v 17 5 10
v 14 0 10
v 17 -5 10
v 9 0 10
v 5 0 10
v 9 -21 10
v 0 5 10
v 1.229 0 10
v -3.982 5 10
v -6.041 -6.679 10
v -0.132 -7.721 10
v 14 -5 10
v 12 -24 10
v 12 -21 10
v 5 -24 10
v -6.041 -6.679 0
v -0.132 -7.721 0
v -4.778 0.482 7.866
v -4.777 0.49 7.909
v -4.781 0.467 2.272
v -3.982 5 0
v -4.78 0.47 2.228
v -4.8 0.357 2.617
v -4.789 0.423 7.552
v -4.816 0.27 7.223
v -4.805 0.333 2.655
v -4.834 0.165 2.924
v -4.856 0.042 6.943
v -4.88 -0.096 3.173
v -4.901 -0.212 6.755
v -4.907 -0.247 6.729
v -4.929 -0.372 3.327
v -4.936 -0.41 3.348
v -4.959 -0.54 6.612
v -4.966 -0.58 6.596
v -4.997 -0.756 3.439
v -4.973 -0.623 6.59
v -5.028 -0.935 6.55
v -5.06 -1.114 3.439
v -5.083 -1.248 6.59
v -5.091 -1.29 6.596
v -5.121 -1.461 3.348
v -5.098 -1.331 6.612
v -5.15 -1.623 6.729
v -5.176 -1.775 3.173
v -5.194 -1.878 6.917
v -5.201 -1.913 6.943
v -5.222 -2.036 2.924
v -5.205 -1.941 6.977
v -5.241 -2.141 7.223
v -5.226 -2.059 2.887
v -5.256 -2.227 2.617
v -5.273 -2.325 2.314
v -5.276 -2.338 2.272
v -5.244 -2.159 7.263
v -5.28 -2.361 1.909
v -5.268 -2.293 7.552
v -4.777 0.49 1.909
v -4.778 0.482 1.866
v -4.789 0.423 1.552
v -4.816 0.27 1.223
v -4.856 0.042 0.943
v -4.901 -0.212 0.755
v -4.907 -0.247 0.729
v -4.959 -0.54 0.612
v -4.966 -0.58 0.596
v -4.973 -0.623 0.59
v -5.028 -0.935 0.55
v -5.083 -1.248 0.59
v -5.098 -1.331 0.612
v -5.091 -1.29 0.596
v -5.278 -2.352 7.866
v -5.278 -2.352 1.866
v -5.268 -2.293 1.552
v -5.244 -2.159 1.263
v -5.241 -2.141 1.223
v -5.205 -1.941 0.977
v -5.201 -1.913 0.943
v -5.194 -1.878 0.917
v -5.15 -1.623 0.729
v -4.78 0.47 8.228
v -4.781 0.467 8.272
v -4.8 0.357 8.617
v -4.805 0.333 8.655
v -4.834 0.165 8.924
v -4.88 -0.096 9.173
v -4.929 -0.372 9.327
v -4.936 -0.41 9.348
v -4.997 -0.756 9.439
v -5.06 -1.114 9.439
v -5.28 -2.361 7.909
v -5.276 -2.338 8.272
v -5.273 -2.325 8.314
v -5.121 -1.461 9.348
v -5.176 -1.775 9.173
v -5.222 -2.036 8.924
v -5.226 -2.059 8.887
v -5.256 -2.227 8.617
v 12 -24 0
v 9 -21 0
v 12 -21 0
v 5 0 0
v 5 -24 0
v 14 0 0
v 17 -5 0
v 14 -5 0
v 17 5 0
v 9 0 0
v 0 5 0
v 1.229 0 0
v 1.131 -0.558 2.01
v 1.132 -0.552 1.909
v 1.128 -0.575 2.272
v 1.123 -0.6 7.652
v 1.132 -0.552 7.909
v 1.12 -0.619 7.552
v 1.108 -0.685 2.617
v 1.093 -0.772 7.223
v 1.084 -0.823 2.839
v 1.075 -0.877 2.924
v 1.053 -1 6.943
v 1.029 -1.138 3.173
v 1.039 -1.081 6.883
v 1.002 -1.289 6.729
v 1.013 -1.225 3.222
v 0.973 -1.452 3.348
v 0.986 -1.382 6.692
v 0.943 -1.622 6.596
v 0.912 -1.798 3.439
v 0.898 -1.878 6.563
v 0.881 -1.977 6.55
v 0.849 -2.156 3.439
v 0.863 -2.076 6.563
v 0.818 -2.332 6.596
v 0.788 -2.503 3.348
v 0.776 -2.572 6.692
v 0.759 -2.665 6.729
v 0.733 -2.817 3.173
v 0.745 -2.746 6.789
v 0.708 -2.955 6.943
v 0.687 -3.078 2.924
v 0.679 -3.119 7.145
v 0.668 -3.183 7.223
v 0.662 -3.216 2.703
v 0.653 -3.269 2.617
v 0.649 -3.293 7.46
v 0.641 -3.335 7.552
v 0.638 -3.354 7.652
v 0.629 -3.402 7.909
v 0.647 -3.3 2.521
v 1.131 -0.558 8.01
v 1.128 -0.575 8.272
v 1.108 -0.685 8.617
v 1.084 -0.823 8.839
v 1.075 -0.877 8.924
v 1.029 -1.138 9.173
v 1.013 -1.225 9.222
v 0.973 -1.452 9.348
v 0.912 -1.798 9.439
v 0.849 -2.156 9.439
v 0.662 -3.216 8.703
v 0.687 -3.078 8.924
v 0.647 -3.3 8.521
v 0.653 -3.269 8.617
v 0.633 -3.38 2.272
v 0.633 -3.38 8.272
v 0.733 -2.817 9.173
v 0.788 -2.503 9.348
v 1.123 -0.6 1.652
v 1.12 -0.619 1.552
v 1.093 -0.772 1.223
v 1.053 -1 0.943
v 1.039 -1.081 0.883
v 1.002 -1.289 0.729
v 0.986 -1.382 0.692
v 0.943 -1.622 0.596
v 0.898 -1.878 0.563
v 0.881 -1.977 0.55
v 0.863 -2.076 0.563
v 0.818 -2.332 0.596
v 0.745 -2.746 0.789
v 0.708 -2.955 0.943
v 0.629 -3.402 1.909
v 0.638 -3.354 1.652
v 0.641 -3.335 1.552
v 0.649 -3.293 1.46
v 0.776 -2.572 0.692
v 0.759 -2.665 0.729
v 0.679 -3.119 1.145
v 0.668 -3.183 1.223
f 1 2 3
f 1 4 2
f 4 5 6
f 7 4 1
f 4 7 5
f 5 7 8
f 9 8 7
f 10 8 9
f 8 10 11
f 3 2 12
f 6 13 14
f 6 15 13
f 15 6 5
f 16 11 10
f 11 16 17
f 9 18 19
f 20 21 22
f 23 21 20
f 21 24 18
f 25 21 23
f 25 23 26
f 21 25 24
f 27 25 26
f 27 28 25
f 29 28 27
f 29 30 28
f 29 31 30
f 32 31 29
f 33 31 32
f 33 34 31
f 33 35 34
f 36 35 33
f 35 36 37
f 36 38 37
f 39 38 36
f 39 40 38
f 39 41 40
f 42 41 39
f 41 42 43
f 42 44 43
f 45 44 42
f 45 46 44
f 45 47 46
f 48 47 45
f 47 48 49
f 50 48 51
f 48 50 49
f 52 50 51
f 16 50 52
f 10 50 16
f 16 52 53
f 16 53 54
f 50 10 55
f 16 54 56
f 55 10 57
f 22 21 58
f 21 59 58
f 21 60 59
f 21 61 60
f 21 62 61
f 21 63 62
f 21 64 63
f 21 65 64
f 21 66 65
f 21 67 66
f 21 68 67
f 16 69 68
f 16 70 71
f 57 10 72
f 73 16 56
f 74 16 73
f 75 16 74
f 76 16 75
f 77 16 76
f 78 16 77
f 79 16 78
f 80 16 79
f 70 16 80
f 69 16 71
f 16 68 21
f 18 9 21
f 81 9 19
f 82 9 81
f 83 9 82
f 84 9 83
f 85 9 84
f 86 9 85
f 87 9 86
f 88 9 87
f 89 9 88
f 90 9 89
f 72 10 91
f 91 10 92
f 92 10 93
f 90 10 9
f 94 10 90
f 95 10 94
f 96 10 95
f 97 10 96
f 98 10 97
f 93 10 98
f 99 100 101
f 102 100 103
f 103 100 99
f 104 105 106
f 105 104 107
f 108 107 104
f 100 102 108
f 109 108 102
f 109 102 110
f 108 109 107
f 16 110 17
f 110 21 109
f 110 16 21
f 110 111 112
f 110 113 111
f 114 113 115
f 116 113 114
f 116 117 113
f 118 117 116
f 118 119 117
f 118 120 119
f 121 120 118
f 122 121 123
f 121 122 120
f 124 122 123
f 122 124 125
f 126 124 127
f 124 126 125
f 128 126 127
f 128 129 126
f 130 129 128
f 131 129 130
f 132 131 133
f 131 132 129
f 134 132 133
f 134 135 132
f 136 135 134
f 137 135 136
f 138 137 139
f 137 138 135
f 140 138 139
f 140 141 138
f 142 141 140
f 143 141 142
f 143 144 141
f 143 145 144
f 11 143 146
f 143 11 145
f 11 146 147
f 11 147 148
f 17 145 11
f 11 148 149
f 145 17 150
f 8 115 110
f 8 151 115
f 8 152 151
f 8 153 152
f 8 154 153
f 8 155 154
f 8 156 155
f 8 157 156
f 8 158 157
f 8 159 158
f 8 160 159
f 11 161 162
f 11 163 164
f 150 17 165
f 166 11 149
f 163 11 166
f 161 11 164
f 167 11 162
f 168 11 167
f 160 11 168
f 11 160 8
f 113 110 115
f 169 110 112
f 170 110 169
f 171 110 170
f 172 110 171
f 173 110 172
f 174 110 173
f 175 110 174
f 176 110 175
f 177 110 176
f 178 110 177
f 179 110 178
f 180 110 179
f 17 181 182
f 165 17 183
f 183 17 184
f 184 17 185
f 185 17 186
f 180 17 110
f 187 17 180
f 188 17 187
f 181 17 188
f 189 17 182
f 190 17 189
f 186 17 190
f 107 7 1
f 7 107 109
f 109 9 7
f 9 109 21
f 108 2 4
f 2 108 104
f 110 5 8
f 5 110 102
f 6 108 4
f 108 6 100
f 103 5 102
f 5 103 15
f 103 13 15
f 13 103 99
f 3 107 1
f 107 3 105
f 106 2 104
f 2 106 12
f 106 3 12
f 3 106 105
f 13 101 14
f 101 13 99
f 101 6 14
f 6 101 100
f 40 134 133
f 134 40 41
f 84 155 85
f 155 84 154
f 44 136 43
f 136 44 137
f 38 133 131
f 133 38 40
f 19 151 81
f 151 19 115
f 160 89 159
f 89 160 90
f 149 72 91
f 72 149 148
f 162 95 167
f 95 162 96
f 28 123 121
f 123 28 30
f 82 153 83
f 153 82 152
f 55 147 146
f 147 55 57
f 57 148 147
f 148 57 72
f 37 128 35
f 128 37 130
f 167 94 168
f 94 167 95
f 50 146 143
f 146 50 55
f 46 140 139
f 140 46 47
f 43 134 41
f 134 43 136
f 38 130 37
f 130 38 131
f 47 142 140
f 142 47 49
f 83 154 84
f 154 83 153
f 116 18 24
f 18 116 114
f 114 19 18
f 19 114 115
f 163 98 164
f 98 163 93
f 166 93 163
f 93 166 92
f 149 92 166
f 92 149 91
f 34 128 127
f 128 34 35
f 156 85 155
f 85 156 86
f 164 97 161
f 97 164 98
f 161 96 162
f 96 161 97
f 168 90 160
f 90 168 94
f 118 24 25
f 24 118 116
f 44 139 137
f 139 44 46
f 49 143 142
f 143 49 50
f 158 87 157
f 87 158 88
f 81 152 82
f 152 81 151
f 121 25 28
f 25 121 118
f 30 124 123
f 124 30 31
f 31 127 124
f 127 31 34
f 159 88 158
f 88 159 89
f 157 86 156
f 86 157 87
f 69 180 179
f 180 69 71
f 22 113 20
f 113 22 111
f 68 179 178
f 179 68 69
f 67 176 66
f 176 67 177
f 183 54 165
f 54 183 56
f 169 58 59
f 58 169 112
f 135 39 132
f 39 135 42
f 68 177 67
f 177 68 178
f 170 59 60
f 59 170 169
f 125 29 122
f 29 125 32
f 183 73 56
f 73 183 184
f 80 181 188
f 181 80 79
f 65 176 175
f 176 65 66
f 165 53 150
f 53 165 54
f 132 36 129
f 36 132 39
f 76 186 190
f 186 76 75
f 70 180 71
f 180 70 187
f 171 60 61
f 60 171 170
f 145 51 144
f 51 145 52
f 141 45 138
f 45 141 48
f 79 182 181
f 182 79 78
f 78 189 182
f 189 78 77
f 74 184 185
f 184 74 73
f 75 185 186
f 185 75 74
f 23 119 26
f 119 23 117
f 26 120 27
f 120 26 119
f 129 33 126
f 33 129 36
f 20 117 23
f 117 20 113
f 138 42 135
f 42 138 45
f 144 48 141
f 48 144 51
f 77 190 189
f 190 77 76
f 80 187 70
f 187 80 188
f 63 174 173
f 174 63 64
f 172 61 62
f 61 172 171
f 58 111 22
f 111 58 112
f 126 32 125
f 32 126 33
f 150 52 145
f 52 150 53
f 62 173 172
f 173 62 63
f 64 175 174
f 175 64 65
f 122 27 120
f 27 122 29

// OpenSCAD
/*
 * Created by:
 * Thomas Buck <xythobuz@xythobuz.de> in March 2016
 *
 * Licensed under the Creative Commons - Attribution license.
 */

// -----------------------------------------------------------

$fn = 25;

height = 10;

// works properly from around 40 to 80 degrees
display_angle = 80; // in degrees

// "right", "left", "both" or "none"
hole_position = "both";
hole_diameter = 2.9;

// -----------------------------------------------------------

module holder() {
    // front part
    translate([10, 0, 0])
    difference() {
        translate([-13 + (5 * sin(display_angle - 45)),
                    -6 - (3 * sin(display_angle - 45)), 0])
            rotate([0, 0, display_angle])
            cube([13, 6, height]);
    
        // cut off top edge
        translate([-15, 5, 0])
            cube([10, 3, height]);
    }

    // upper body
    translate([0, 0, 0])
        cube([10, 5, height]);

    // lower body
    translate([5, -24, 0])
        cube([4, 24, height]);

    // upper border
    translate([10, 0, 0])
        cube([7, 5, height]);

    // upper lip
    translate([14, -5, 0])
        cube([3, 5, height]);

    // lower border
    translate([9, -24, 0])
        cube([3, 3, height]);
}

difference() {
    holder();
    
    // insert holes
    if ((hole_position == "right") || (hole_position == "both")) {
        rotate([0, 90, 90 + display_angle])
            translate([-8, -0.5 + (4 * sin(display_angle - 45)), -4])
            cylinder(d=hole_diameter, h=10);
    }
    if ((hole_position == "left") || (hole_position == "both")) {
        rotate([0, 90, 90 + display_angle])
            translate([-2, -0.5 + (4 * sin(display_angle - 45)), -4])
            cylinder(d=hole_diameter, h=10);
    }
}
